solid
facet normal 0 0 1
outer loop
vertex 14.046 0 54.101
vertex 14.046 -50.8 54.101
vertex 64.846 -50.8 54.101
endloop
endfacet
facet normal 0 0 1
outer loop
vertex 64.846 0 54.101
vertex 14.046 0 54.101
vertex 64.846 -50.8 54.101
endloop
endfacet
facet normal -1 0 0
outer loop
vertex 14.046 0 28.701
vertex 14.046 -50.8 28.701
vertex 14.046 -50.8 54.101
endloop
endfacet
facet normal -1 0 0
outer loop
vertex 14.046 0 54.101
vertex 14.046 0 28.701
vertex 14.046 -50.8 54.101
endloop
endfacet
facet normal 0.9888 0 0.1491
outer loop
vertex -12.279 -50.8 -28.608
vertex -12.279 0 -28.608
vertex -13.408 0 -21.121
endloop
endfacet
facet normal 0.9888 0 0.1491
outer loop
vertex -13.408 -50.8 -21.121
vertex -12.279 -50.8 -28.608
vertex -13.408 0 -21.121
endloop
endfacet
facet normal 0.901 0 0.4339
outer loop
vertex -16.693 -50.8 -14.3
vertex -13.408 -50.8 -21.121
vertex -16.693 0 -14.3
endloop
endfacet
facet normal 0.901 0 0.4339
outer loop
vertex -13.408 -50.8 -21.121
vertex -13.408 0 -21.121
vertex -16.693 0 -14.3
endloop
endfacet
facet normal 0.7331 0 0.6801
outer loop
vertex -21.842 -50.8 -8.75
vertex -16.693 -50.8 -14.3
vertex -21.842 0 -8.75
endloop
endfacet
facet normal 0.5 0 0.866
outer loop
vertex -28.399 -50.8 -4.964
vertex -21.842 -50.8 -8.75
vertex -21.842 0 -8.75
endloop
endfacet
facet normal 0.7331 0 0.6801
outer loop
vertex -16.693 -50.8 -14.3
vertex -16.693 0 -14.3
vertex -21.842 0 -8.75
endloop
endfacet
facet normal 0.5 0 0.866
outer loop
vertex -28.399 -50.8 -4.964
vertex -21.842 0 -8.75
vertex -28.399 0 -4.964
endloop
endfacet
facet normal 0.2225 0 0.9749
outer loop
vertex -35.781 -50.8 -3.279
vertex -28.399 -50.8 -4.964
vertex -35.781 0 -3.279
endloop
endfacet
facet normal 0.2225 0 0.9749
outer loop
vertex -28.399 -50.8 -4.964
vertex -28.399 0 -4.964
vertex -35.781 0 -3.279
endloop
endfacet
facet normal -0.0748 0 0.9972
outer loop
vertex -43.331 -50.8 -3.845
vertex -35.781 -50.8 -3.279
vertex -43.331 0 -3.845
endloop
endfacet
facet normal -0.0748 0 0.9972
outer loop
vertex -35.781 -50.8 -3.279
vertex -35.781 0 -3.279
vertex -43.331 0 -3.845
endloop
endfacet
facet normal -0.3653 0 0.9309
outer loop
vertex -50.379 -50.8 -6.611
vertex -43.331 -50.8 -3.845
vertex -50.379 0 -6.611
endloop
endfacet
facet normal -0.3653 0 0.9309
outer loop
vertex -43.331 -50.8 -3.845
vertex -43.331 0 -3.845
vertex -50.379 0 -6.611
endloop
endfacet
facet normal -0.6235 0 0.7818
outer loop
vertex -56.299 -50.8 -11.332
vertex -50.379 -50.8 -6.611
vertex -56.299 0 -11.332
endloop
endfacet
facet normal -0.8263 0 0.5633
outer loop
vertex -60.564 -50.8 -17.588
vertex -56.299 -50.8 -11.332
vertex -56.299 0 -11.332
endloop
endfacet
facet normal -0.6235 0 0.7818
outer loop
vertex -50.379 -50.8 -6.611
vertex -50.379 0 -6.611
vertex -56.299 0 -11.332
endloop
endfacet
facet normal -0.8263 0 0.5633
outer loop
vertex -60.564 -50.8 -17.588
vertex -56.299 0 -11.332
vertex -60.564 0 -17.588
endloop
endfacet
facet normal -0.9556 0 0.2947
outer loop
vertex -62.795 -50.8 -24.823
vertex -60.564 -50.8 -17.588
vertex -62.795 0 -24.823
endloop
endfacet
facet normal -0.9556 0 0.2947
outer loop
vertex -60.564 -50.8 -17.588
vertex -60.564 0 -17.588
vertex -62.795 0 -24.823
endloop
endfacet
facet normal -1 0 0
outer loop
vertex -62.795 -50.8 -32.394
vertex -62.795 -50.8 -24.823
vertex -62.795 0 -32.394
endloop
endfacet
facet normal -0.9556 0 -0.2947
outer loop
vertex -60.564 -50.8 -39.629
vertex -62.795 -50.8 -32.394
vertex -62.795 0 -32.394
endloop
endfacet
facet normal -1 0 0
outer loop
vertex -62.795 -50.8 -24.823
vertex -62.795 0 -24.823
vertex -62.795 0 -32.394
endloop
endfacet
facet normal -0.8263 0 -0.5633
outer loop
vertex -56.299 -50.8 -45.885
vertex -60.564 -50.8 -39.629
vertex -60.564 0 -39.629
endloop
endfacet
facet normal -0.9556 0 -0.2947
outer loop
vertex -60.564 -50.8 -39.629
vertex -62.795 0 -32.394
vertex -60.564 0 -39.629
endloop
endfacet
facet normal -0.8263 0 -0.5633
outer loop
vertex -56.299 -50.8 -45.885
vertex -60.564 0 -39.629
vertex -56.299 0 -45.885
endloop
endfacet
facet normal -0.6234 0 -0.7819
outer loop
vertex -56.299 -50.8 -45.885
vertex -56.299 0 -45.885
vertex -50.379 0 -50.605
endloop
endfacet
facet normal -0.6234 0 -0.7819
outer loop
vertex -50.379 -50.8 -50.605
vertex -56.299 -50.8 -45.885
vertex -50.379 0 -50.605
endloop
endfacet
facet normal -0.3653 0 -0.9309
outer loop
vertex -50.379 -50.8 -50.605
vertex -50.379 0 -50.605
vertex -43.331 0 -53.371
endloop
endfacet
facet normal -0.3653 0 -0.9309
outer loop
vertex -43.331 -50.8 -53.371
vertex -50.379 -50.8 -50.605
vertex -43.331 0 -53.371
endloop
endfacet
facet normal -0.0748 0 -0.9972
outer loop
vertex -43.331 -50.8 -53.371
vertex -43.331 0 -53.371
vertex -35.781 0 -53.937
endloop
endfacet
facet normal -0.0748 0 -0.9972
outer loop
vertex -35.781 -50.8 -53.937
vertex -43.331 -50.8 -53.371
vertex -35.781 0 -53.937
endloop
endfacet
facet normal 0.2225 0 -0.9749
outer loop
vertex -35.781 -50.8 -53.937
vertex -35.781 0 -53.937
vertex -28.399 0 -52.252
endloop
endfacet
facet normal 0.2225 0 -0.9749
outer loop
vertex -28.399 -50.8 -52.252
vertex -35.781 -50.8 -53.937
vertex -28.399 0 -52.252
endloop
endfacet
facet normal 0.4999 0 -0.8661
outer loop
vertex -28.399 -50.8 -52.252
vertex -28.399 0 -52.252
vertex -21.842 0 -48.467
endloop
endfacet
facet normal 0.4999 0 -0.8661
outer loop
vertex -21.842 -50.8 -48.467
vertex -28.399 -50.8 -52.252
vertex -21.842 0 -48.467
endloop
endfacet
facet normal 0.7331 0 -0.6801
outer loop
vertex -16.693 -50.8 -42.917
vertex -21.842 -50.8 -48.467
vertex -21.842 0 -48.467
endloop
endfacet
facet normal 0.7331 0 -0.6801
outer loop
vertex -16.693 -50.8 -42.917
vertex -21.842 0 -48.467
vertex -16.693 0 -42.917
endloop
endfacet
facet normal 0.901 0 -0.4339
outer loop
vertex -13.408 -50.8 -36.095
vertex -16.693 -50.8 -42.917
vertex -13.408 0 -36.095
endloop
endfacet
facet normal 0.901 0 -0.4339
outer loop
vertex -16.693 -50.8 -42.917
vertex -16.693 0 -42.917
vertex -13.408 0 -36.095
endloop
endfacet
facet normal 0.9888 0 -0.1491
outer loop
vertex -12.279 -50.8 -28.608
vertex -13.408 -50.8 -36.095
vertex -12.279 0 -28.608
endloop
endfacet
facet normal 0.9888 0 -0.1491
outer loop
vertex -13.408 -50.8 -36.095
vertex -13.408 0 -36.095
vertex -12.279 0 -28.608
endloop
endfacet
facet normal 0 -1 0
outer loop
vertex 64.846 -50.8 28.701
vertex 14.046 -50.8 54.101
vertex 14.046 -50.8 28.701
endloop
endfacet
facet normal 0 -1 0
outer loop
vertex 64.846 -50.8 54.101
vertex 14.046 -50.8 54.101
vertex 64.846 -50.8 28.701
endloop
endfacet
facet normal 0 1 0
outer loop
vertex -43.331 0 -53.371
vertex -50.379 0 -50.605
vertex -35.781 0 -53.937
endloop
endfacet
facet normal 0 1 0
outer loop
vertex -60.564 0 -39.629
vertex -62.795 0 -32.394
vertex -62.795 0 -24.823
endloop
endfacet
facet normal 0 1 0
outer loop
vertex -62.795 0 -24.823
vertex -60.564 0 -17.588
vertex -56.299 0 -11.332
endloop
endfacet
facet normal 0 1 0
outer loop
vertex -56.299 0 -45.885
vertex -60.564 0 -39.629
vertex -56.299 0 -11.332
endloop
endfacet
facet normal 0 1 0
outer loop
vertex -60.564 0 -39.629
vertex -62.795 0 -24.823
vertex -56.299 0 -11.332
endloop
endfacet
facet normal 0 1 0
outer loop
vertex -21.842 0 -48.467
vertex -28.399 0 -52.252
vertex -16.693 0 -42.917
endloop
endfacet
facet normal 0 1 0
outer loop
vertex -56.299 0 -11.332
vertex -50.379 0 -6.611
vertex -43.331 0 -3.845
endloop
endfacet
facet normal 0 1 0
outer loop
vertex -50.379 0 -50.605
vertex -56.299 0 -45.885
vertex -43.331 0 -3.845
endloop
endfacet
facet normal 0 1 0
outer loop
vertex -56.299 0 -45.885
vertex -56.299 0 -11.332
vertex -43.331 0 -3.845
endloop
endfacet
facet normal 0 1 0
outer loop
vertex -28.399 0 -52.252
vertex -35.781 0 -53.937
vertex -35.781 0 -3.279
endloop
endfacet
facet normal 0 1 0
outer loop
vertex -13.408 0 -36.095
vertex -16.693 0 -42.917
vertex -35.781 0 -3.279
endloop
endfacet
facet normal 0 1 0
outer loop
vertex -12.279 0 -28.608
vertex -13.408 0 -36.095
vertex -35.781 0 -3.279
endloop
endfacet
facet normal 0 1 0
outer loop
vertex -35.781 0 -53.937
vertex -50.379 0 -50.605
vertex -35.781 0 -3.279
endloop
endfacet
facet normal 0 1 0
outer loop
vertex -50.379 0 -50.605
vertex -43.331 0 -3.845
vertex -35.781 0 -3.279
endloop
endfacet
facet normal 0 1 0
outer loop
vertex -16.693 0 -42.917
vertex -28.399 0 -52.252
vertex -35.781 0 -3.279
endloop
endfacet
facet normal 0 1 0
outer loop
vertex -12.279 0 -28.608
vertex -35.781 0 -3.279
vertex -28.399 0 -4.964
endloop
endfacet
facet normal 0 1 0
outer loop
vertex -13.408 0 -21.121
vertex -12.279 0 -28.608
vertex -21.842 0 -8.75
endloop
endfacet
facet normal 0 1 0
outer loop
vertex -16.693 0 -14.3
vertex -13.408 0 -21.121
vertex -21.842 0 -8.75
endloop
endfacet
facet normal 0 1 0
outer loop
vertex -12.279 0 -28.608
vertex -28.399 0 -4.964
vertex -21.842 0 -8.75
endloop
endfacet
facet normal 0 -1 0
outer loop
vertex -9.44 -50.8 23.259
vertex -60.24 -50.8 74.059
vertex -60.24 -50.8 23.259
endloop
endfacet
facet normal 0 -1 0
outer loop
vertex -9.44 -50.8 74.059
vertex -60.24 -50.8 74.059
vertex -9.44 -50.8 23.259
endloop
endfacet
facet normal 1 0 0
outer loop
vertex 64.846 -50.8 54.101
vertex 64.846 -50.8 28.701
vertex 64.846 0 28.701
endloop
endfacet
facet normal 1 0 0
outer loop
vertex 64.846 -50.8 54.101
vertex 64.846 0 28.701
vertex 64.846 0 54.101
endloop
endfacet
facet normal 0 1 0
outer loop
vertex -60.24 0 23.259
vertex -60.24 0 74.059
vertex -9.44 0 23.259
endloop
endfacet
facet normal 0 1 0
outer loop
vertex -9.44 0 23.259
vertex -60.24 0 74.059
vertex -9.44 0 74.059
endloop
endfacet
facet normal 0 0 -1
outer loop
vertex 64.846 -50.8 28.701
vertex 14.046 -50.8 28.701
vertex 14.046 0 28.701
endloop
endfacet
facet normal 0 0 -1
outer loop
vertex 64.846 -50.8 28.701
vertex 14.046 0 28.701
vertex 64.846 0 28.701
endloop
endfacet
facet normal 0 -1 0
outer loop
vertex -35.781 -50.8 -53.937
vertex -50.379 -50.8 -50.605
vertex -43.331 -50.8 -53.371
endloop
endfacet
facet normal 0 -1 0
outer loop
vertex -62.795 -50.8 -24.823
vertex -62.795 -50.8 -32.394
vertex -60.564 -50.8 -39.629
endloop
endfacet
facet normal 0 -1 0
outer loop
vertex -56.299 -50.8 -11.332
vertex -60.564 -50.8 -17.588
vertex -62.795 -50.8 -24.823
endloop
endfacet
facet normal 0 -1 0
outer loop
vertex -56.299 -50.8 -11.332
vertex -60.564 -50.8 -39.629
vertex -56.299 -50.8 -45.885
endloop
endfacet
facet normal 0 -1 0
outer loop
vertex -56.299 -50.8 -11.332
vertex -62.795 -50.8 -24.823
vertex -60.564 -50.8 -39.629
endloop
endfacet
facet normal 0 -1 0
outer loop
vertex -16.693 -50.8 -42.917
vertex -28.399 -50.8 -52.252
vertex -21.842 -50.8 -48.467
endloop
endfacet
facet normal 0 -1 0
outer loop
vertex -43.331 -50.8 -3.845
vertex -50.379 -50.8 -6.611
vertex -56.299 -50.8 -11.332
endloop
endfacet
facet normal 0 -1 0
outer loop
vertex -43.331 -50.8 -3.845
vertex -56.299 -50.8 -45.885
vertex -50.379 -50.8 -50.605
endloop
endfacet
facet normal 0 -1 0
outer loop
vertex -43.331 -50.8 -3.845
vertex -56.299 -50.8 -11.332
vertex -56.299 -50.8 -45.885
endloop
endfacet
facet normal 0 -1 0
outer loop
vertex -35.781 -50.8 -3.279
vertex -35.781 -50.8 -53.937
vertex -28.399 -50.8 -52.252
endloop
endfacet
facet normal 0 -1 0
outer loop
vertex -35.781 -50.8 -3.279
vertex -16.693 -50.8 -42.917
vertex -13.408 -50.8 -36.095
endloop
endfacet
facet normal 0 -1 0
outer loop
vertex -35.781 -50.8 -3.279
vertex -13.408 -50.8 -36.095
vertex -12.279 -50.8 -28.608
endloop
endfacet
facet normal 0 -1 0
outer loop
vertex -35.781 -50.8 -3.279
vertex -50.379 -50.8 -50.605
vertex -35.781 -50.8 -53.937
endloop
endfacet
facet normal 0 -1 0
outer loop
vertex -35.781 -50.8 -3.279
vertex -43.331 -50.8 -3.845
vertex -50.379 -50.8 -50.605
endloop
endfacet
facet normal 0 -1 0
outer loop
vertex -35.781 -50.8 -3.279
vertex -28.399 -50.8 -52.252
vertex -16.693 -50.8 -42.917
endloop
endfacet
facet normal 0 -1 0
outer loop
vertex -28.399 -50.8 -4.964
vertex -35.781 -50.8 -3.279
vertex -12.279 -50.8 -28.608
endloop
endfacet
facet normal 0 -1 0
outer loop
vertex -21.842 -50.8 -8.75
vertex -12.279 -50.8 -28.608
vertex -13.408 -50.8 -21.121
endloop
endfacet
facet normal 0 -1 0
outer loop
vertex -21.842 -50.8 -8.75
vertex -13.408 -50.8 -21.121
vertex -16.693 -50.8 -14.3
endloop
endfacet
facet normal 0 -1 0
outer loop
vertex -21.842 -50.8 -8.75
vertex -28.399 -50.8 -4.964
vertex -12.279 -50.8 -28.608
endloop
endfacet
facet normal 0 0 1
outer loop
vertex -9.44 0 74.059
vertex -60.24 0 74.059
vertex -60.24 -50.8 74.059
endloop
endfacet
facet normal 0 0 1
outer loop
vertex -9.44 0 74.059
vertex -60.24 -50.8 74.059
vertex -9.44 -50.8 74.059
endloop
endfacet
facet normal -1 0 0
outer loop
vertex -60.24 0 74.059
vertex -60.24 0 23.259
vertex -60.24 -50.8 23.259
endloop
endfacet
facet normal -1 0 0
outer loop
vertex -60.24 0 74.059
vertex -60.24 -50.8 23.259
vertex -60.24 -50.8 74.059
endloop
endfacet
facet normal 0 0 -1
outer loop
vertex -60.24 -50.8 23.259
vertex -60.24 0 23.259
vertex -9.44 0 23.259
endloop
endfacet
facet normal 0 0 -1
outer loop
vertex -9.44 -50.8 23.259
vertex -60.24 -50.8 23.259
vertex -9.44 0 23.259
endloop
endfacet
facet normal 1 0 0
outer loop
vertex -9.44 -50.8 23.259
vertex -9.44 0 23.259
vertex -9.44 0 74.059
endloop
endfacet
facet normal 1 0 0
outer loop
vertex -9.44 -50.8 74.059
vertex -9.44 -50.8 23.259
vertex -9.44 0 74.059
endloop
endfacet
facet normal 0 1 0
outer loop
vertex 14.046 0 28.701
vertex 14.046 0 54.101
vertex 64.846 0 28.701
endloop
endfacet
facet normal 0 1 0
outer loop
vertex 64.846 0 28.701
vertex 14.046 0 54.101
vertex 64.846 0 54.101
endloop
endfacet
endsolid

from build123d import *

# Parameters (mm, degrees)
F0_W     = 50.8
F0_H     = 50.8
F3_DEPTH = 50.8
F1_W     = 50.8
F1_H     = 25.4
F4_DEPTH = 50.8
F2_R     = 25.4
F5_DEPTH = 50.8


with BuildPart() as f3:
    # F0 (on Front) → F3 (new body)
    with BuildSketch(Plane.XZ):
        with Locations((-34.840092, 48.658716)):
            Rectangle(F0_W, F0_H)
    extrude(amount=F3_DEPTH)


with BuildPart() as f4:
    # F1 (on Front) → F4 (new body)
    with BuildSketch(Plane.XZ):
        with Locations((39.446117, 41.400529)):
            Rectangle(F1_W, F1_H)
    extrude(amount=F4_DEPTH)


with BuildPart() as f5:
    # F2 (on Front) → F5 (new body)
    with BuildSketch(Plane.XZ):
        with Locations((-37.679128, -28.608227)):
            Circle(F2_R)
    extrude(amount=F5_DEPTH)


solid = Compound([f3.part, f4.part, f5.part])
